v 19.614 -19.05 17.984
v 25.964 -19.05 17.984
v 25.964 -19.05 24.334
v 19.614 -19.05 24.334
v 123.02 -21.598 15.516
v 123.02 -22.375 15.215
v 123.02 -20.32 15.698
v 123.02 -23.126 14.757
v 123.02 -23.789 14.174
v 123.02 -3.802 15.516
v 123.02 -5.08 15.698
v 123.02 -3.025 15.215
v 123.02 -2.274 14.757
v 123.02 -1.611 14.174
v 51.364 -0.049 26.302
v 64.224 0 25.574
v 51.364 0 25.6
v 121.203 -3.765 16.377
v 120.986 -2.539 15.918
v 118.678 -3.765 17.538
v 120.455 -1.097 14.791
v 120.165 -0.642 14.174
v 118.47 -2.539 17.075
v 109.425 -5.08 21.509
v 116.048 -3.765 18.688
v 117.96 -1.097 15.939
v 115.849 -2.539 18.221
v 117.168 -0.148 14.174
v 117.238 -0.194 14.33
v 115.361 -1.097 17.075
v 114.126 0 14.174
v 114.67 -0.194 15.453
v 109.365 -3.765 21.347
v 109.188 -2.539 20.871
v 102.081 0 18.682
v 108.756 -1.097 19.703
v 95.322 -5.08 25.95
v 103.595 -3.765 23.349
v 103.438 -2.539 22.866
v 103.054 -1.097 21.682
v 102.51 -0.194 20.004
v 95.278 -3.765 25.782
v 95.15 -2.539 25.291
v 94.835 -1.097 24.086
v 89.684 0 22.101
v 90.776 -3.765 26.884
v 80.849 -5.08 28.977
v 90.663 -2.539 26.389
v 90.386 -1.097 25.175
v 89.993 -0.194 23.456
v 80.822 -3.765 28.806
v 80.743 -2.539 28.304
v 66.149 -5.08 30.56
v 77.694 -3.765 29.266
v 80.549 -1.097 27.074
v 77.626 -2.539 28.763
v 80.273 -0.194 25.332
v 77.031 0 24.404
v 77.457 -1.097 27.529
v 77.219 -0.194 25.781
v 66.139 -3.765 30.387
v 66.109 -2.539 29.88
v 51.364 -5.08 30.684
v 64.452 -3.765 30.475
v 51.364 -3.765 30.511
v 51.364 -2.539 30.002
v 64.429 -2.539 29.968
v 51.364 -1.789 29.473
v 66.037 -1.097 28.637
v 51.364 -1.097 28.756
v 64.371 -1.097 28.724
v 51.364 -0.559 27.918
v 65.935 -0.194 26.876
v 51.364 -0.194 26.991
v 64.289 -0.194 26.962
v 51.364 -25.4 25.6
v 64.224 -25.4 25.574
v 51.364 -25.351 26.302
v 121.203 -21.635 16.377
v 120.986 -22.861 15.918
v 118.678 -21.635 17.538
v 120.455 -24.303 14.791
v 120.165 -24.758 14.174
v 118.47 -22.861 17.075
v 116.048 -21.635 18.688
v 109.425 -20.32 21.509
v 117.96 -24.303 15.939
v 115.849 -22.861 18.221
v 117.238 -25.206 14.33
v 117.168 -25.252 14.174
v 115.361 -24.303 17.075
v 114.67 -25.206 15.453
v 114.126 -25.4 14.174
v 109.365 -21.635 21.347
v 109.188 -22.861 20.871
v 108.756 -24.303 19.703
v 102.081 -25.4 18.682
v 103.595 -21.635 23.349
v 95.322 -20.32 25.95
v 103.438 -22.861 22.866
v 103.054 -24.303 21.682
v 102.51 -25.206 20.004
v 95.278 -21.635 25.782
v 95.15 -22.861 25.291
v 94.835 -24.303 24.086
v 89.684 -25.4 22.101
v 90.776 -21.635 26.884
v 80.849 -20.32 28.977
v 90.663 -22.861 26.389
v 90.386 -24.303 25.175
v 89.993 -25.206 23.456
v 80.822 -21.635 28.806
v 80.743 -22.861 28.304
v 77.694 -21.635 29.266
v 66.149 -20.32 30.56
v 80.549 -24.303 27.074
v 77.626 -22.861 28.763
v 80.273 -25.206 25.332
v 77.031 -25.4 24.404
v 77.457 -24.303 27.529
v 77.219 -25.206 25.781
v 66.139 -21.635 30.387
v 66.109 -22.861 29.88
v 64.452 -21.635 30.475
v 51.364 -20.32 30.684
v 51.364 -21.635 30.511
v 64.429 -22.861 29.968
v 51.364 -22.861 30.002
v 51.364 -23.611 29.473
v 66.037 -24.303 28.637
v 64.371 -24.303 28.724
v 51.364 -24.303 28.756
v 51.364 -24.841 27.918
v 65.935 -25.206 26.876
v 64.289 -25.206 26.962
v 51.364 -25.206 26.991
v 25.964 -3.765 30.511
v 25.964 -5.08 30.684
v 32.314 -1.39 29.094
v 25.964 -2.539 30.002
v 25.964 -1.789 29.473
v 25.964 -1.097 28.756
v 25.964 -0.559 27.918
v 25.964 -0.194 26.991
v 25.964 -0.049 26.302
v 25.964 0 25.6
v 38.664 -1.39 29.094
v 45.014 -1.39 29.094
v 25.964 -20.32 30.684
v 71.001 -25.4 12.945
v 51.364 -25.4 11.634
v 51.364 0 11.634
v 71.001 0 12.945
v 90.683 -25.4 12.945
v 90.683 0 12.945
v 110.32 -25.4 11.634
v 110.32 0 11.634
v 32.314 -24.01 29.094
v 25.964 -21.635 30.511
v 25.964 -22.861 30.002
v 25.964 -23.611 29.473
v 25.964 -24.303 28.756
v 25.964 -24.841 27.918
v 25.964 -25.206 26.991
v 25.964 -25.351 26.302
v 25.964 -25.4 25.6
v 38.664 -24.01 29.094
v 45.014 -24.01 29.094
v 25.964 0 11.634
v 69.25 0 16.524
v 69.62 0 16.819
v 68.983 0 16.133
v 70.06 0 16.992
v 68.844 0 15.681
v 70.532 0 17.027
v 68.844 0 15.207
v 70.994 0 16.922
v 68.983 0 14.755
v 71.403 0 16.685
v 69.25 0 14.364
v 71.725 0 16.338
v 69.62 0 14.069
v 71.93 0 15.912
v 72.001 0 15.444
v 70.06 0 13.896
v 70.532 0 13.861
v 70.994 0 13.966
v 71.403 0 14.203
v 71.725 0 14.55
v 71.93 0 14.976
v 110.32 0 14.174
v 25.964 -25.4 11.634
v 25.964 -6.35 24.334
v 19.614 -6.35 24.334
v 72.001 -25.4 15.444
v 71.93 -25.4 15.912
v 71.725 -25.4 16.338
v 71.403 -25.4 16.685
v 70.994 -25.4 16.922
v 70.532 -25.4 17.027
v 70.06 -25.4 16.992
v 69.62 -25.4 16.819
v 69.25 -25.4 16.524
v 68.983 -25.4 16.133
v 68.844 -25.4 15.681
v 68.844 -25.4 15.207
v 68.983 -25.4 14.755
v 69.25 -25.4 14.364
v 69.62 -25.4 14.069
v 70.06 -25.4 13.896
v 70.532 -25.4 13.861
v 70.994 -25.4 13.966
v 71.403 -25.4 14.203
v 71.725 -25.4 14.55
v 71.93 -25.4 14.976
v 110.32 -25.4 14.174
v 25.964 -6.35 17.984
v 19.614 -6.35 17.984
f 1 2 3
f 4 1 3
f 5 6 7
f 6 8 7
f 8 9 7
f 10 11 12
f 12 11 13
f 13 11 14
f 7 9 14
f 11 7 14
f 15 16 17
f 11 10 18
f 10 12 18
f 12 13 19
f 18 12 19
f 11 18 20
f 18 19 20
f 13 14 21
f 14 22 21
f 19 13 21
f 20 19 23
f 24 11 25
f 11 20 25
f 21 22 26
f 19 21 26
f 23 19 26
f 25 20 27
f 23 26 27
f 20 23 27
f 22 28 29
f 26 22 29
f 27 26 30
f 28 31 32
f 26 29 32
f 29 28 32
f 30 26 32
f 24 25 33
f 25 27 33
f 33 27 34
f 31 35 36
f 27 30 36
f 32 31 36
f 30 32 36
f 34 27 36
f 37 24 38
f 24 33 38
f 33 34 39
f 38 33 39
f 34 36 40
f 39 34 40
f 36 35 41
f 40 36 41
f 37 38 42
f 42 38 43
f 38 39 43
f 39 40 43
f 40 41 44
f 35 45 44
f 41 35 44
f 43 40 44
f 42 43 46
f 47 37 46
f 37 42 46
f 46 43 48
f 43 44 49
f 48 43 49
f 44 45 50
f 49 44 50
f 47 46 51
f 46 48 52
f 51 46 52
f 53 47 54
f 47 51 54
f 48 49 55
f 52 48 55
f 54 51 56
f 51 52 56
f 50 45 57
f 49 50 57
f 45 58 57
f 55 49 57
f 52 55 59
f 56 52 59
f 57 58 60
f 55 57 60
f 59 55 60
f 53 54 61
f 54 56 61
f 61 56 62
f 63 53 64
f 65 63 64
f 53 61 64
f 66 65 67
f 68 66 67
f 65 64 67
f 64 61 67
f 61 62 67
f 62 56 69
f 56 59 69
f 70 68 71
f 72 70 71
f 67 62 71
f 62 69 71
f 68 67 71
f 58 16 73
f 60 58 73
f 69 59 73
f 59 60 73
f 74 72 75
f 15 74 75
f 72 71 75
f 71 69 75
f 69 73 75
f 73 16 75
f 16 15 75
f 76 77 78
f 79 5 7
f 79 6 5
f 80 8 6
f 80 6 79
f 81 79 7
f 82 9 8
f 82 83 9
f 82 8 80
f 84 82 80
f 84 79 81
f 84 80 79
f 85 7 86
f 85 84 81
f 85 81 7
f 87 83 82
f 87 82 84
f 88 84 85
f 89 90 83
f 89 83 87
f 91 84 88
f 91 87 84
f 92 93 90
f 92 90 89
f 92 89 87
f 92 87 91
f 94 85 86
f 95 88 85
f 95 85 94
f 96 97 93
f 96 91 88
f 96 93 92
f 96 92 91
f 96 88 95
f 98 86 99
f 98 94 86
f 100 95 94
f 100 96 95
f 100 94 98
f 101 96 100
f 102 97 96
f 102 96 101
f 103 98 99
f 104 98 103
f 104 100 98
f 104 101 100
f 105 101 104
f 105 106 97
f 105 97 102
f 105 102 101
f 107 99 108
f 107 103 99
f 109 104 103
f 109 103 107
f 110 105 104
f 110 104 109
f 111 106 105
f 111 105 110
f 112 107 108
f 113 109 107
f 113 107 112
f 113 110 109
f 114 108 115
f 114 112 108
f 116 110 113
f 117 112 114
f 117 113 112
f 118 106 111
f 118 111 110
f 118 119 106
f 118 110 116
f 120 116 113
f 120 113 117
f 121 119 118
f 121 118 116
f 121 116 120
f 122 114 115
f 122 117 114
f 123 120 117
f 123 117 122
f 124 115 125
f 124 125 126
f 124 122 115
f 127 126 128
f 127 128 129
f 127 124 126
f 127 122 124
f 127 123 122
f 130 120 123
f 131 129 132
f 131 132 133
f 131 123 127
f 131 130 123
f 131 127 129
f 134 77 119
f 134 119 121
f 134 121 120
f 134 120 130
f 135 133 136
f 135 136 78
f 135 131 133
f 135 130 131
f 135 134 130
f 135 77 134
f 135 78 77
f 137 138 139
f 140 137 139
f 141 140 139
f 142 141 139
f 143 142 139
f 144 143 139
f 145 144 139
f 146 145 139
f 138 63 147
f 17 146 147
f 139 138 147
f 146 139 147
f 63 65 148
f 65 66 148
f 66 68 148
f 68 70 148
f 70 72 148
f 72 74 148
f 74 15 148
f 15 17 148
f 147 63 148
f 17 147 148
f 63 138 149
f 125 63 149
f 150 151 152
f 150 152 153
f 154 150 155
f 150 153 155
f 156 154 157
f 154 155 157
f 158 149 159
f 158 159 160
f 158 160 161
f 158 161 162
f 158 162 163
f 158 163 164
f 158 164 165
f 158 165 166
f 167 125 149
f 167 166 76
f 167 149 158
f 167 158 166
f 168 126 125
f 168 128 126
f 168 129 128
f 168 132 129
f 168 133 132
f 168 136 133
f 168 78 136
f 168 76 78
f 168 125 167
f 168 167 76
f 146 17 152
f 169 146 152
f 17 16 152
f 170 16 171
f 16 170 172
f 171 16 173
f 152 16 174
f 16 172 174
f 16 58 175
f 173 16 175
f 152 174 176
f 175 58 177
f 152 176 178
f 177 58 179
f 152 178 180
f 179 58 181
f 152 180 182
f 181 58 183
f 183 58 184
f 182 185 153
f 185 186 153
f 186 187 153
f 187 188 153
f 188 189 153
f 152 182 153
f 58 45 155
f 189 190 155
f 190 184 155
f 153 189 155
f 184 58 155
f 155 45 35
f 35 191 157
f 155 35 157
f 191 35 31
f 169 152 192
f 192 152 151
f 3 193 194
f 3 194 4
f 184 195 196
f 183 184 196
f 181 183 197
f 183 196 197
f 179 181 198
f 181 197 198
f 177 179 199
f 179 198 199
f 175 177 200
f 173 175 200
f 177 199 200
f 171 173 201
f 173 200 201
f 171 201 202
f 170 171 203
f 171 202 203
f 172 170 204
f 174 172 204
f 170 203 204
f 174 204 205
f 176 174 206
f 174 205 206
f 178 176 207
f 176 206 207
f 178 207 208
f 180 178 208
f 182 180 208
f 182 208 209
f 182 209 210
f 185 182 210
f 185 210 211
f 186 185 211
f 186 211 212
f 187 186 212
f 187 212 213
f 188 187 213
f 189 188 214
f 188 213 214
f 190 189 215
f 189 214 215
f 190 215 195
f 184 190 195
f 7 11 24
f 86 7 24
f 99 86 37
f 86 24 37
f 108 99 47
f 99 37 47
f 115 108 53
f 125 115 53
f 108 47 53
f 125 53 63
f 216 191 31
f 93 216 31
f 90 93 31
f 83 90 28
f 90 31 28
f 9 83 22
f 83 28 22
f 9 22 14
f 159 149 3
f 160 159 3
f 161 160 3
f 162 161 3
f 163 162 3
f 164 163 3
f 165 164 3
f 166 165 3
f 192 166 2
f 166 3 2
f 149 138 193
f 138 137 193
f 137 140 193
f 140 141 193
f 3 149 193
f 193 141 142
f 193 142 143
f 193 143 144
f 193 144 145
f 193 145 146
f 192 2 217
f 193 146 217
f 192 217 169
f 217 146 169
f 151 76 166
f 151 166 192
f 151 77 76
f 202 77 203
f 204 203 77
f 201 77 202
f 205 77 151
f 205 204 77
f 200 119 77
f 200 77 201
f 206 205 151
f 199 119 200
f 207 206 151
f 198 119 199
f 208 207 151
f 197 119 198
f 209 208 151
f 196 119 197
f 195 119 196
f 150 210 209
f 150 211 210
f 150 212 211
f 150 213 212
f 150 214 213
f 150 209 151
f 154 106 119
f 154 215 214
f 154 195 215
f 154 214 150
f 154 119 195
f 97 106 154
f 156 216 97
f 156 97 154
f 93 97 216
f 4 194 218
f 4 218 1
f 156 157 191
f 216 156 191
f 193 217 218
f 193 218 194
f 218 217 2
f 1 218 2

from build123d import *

# Parameters (mm, degrees)
F1_DEPTH = 12.7
F2_R     = 2.54
F3_DEPTH = 12.7
F4_SCALE = 2
F5_W     = 12.7
F5_H     = 6.35
F6_DEPTH = 6.35
F7_R     = 1.5875
F8_DEPTH = 25.4


with BuildPart() as f1:
    # F0 (on Front) → F1 (new body)
    with BuildSketch(Plane.XZ):
        with BuildLine():
            Line((61.5102246263, 7.086984636), (61.5102246263, 7.848984636))
            ThreePointArc((61.5102246263, 7.848984636), (44.0614550619, 13.8211347469), (25.6817610527, 15.341984636))
            Line((25.6817610527, 15.341984636), (25.6817610527, 5.816984636))
            ThreePointArc((25.6817610527, 5.816984636), (40.4209928395, 6.5545750011), (55.1602246263, 5.816984636))
            Line((55.1602246263, 5.816984636), (55.1602246263, 7.086984636))
            Line((55.1602246263, 7.086984636), (61.5102246263, 7.086984636))
        make_face()
    extrude(amount=F1_DEPTH)

    # F2
    f2_edges = [f1.edges().sort_by_distance(p)[0] for p in [
        (44.061455, -12.7, 13.821135),
        (44.061455, 0, 13.821135),
    ]]
    fillet(f2_edges, radius=F2_R)

    # F3 (add): a face of the model
    f3_faces = [f1.faces().sort_by_distance(p)[0] for p in [
        (25.6817610527, -6.35, 10.4811297922),
    ]]
    extrude(f3_faces, amount=F3_DEPTH)


with BuildPart() as f1_1:
    # F4: moved
    add(f1.part.scale(F4_SCALE))

    # F5 (on face) → F6 (join)
    with BuildSketch(Plane(origin=(25.9635221053, 0, 0), x_dir=(0, -1, 0), z_dir=(-1, 0, 0))):
        with Locations((12.7, 21.1589692719)):
            Rectangle(F5_W, F5_H)
    extrude(amount=F6_DEPTH)

    # F7 (on face) → F8 (cut)
    with BuildSketch(Plane.XZ.offset(25.4)):
        with Locations((70.4135221053, 15.4439692719)):
            Circle(F7_R)
    extrude(amount=-F8_DEPTH, mode=Mode.SUBTRACT)


solid = f1_1.part
